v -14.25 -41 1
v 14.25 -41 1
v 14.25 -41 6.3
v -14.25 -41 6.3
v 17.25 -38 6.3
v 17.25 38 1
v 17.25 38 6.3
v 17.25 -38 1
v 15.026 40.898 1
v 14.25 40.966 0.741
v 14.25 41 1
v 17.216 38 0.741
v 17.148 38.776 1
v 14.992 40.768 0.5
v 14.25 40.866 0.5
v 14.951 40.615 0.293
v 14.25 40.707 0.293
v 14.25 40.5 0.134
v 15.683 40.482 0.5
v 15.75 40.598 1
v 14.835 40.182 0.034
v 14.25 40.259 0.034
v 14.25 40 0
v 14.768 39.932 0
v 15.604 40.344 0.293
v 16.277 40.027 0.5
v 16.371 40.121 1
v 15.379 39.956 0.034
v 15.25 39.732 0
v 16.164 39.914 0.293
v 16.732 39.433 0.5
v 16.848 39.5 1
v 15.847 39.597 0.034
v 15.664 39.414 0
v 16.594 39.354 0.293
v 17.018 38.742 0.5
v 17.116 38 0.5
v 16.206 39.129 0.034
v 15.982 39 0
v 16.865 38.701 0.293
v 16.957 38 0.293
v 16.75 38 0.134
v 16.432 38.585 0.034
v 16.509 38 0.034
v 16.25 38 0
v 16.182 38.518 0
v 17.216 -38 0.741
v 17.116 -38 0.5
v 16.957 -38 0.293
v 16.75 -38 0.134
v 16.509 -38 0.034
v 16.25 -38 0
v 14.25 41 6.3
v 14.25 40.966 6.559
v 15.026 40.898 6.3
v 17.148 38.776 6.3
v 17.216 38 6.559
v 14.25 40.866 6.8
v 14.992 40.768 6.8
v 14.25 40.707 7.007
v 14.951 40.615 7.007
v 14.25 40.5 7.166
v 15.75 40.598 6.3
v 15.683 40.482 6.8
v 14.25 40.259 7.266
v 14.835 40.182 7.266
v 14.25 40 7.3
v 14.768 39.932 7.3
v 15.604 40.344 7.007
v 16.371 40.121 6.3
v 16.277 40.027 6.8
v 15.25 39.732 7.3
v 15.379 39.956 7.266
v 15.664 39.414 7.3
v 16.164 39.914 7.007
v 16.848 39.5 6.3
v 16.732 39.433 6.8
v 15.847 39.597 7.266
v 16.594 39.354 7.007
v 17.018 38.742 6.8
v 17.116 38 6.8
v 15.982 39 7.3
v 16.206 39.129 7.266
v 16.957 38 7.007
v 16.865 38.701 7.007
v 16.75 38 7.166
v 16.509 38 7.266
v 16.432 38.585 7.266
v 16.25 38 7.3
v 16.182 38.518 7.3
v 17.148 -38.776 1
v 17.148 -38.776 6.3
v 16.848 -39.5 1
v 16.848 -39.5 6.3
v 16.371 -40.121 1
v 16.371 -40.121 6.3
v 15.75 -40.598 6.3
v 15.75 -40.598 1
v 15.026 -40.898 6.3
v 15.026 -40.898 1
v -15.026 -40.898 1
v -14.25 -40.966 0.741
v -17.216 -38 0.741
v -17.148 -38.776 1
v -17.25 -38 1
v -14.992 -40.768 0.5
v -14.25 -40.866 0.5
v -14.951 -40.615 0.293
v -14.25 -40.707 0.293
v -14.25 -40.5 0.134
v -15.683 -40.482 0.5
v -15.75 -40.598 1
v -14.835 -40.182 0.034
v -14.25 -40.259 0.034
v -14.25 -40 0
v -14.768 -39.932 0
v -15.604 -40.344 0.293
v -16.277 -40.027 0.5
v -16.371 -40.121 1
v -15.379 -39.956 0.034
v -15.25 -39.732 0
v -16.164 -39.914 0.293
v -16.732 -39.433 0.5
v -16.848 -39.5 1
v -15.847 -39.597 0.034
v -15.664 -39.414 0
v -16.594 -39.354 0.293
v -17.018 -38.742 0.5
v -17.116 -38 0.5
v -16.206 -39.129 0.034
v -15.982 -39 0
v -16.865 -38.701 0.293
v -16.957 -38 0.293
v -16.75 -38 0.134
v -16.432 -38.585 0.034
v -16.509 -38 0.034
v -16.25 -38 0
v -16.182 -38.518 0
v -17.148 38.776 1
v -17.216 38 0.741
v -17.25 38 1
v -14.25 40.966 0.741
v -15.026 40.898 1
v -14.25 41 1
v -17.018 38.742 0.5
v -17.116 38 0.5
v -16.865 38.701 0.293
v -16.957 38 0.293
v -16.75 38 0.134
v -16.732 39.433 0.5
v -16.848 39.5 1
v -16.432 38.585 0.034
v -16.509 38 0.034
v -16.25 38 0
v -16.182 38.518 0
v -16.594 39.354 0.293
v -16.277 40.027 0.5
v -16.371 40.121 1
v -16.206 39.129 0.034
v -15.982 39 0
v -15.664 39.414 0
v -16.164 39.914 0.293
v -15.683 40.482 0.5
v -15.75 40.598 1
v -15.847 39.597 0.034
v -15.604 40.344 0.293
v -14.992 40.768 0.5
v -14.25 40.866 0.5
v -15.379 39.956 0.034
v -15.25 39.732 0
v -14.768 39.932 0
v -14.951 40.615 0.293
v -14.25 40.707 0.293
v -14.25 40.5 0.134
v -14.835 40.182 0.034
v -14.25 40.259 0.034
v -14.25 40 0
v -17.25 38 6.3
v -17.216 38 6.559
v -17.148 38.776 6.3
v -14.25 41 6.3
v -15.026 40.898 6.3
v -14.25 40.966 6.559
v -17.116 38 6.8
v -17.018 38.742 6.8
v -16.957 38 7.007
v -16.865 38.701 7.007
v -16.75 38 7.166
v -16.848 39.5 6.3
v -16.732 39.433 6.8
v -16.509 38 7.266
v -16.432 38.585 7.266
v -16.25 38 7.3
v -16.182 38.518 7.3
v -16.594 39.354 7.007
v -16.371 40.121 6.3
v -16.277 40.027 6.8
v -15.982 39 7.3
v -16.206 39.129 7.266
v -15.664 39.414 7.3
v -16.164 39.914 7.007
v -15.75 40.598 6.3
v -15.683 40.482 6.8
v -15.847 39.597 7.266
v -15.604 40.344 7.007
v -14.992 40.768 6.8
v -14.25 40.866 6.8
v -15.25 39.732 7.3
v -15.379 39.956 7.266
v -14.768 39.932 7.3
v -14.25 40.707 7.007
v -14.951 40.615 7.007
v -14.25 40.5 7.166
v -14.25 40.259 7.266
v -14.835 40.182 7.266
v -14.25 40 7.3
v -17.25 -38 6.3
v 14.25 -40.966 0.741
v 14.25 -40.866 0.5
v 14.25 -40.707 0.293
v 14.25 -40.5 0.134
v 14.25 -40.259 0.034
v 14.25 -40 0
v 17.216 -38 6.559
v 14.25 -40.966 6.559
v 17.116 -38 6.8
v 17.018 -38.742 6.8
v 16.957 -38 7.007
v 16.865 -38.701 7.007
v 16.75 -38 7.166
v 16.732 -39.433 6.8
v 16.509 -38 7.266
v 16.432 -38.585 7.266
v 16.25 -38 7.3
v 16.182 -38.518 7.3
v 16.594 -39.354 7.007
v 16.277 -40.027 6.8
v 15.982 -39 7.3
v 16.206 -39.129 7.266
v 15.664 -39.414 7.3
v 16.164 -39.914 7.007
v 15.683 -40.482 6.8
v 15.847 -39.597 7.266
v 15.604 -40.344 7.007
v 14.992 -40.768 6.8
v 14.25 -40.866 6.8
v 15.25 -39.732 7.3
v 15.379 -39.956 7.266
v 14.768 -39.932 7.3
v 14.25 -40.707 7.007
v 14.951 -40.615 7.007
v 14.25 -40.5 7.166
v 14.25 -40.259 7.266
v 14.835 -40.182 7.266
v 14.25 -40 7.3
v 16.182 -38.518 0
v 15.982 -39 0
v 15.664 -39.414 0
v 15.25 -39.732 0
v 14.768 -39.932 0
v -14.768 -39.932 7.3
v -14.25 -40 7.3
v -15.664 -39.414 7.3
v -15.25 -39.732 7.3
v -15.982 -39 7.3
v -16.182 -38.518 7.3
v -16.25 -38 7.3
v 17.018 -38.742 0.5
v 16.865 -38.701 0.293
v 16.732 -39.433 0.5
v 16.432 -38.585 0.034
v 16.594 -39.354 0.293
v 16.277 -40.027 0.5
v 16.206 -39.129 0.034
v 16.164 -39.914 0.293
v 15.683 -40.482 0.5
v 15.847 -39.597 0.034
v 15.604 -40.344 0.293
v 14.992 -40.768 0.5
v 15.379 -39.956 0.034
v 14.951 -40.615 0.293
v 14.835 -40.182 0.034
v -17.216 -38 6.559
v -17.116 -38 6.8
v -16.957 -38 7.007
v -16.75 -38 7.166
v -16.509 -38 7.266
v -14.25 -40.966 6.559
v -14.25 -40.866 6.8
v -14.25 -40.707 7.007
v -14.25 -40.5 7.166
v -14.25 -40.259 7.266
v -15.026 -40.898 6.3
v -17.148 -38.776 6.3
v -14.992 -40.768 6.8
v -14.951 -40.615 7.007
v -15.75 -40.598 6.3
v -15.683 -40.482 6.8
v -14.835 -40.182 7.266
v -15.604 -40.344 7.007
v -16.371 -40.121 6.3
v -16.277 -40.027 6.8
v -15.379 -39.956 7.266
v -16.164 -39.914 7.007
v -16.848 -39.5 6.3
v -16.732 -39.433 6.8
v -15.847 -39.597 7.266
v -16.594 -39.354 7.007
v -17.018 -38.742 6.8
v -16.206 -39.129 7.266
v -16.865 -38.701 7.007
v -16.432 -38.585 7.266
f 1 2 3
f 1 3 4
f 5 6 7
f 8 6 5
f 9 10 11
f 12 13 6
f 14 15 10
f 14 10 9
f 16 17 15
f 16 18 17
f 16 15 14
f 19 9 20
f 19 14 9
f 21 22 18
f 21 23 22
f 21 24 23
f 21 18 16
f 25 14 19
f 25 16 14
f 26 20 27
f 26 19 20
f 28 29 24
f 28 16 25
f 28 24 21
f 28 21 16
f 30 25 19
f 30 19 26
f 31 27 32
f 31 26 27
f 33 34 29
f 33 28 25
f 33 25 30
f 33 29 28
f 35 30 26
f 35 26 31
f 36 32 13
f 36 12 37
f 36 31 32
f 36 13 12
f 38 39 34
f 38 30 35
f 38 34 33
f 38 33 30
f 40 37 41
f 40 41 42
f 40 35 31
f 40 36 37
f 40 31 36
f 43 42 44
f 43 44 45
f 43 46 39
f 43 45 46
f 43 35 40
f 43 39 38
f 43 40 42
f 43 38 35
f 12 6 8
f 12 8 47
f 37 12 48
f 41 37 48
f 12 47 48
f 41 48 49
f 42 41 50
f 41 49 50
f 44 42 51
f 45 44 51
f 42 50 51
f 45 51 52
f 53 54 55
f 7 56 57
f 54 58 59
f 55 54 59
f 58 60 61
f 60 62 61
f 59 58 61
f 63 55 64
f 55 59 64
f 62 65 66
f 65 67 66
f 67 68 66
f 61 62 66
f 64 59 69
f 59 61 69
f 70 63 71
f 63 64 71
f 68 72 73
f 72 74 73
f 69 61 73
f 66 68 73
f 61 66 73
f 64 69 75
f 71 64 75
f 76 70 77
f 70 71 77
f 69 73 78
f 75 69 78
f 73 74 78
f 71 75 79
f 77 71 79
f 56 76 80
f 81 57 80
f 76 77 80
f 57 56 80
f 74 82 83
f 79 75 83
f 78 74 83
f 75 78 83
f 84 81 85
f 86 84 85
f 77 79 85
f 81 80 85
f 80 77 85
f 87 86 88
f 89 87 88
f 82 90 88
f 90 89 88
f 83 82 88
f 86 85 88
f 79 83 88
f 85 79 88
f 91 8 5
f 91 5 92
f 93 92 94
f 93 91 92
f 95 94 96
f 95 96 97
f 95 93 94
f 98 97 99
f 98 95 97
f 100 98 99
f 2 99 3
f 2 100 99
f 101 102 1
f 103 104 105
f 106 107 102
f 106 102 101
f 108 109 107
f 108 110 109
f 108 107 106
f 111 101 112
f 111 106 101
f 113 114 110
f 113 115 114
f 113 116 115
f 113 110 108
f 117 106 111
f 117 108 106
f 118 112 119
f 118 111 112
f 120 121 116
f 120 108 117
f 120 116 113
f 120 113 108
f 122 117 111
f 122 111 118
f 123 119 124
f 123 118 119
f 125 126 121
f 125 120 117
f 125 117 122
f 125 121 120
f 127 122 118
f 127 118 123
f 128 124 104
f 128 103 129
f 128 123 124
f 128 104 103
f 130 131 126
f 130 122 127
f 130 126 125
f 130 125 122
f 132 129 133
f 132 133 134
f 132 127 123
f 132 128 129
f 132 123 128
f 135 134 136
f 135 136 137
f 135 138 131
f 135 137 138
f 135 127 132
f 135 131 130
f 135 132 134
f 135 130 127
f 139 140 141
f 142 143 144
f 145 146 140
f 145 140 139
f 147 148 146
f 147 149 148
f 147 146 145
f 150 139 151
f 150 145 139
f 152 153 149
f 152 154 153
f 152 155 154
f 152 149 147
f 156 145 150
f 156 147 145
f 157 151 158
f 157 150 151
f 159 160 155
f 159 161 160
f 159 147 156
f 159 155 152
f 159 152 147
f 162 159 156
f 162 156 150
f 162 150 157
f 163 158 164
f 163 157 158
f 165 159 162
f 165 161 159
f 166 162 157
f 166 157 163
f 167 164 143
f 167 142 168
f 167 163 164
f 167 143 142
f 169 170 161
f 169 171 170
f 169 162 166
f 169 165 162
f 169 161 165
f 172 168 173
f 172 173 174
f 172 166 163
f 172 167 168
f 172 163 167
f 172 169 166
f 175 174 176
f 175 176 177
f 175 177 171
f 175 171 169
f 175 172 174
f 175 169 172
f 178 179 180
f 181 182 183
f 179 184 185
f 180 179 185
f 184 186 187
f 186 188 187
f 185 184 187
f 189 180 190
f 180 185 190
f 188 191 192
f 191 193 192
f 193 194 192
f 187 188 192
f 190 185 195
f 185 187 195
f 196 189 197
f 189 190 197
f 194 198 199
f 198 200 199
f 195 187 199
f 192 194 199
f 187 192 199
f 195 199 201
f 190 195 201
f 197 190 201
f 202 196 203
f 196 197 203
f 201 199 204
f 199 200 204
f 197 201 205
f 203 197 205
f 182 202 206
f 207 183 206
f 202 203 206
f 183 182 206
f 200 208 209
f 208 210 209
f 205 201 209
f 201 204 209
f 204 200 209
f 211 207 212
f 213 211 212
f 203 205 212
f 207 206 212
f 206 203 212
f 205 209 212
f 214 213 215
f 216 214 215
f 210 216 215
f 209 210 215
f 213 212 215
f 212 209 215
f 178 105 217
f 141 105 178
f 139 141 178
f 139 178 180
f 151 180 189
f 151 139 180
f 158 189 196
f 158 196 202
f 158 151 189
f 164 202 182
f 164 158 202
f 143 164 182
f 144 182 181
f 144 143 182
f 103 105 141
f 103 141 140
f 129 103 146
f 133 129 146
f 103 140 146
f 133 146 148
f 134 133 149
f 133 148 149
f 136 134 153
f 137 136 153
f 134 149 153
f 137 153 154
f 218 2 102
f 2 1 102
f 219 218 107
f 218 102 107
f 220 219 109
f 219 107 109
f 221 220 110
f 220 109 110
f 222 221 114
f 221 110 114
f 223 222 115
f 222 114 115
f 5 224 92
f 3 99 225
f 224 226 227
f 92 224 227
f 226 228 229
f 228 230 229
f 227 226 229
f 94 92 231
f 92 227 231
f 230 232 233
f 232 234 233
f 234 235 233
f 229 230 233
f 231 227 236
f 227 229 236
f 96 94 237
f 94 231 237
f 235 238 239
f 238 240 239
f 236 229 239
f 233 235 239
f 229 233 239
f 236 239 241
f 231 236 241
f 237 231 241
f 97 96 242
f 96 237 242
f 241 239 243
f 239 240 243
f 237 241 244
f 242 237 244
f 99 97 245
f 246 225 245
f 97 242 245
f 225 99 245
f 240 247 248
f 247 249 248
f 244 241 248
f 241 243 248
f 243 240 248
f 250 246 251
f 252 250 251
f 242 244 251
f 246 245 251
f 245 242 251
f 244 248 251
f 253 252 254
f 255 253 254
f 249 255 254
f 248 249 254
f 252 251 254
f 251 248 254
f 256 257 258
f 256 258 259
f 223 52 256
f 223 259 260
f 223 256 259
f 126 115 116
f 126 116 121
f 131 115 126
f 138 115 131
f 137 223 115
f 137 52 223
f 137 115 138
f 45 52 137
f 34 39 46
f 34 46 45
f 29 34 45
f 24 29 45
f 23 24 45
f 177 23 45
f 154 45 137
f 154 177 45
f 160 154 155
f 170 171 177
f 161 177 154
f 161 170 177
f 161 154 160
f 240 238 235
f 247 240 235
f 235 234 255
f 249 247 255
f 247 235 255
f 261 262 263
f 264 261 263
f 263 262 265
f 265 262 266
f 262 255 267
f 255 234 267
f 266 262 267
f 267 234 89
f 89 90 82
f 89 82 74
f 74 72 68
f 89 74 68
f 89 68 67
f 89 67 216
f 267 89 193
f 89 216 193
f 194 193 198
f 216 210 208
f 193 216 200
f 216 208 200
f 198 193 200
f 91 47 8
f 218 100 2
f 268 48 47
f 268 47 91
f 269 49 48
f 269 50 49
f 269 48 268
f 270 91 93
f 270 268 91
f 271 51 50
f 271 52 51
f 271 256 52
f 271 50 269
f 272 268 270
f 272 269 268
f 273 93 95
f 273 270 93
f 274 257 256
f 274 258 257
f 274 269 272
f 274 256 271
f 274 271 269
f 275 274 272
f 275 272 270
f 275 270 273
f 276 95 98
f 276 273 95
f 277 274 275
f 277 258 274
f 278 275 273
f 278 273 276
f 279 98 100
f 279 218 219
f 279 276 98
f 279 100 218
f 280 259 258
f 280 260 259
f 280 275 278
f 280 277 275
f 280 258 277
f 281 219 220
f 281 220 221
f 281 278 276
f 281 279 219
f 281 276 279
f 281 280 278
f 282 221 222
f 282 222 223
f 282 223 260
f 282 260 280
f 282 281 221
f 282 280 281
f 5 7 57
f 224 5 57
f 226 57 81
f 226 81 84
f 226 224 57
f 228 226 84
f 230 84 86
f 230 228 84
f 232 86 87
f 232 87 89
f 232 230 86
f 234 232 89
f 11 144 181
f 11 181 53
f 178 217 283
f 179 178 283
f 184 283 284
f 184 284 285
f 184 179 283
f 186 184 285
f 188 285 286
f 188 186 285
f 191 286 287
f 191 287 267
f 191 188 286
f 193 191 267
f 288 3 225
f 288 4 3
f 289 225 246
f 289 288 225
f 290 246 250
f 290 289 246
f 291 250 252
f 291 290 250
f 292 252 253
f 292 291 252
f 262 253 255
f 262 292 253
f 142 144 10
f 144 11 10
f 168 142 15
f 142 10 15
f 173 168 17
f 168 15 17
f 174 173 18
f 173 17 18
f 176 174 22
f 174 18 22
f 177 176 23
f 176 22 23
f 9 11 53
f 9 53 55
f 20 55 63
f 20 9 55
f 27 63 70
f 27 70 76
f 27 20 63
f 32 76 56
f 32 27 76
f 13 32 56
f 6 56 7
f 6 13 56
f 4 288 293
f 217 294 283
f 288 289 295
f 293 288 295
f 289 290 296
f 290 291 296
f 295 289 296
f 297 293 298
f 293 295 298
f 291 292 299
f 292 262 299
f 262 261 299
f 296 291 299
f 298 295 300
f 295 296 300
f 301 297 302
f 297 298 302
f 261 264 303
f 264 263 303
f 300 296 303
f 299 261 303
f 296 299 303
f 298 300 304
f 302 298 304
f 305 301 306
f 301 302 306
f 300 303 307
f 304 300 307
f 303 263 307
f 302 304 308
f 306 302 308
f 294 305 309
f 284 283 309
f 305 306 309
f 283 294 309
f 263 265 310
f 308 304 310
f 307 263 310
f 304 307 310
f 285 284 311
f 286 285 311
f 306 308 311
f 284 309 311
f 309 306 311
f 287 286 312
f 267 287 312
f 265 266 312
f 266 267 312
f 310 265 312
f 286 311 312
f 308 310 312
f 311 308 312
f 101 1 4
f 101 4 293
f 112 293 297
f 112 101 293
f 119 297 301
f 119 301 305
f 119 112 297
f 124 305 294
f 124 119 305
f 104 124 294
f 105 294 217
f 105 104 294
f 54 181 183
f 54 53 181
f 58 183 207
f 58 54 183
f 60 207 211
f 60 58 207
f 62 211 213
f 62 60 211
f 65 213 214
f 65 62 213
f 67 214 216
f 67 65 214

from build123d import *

# Parameters (mm, degrees)
EXTRUDE_1_DEPTH = 7.3
FILLET_1_R      = 1


with BuildPart() as part:
    # 草图1 → 凸台-拉伸1 (new body)
    with BuildSketch(Plane.XY):
        with BuildLine():
            Line((-14.25, 41), (14.25, 41))
            ThreePointArc((14.25, 41), (16.371320344, 40.121320344), (17.25, 38))
            Line((17.25, 38), (17.25, -38))
            ThreePointArc((17.25, -38), (16.371320344, -40.121320344), (14.25, -41))
            Line((14.25, -41), (-14.25, -41))
            ThreePointArc((-14.25, -41), (-16.371320344, -40.121320344), (-17.25, -38))
            Line((-17.25, -38), (-17.25, 38))
            ThreePointArc((-17.25, 38), (-16.371320344, 40.121320344), (-14.25, 41))
        make_face()
    extrude(amount=EXTRUDE_1_DEPTH)

    # 圆角1
    fillet_1_edges = [part.edges().sort_by_distance(p)[0] for p in [
        (17.25, 0, 0),
        (16.371320344, -40.121320344, 0),
        (0, -41, 0),
        (-16.371320344, -40.121320344, 0),
        (16.371320344, -40.121320344, 7.3),
        (17.25, 0, 7.3),
        (16.371320344, 40.121320344, 7.3),
        (0, 41, 7.3),
        (-16.371320344, 40.121320344, 7.3),
        (-17.25, 0, 7.3),
        (-16.371320344, -40.121320344, 7.3),
        (-17.25, 0, 0),
        (0, -41, 7.3),
        (-16.371320344, 40.121320344, 0),
        (0, 41, 0),
        (16.371320344, 40.121320344, 0),
    ]]
    fillet(fillet_1_edges, radius=FILLET_1_R)


solid = part.part
